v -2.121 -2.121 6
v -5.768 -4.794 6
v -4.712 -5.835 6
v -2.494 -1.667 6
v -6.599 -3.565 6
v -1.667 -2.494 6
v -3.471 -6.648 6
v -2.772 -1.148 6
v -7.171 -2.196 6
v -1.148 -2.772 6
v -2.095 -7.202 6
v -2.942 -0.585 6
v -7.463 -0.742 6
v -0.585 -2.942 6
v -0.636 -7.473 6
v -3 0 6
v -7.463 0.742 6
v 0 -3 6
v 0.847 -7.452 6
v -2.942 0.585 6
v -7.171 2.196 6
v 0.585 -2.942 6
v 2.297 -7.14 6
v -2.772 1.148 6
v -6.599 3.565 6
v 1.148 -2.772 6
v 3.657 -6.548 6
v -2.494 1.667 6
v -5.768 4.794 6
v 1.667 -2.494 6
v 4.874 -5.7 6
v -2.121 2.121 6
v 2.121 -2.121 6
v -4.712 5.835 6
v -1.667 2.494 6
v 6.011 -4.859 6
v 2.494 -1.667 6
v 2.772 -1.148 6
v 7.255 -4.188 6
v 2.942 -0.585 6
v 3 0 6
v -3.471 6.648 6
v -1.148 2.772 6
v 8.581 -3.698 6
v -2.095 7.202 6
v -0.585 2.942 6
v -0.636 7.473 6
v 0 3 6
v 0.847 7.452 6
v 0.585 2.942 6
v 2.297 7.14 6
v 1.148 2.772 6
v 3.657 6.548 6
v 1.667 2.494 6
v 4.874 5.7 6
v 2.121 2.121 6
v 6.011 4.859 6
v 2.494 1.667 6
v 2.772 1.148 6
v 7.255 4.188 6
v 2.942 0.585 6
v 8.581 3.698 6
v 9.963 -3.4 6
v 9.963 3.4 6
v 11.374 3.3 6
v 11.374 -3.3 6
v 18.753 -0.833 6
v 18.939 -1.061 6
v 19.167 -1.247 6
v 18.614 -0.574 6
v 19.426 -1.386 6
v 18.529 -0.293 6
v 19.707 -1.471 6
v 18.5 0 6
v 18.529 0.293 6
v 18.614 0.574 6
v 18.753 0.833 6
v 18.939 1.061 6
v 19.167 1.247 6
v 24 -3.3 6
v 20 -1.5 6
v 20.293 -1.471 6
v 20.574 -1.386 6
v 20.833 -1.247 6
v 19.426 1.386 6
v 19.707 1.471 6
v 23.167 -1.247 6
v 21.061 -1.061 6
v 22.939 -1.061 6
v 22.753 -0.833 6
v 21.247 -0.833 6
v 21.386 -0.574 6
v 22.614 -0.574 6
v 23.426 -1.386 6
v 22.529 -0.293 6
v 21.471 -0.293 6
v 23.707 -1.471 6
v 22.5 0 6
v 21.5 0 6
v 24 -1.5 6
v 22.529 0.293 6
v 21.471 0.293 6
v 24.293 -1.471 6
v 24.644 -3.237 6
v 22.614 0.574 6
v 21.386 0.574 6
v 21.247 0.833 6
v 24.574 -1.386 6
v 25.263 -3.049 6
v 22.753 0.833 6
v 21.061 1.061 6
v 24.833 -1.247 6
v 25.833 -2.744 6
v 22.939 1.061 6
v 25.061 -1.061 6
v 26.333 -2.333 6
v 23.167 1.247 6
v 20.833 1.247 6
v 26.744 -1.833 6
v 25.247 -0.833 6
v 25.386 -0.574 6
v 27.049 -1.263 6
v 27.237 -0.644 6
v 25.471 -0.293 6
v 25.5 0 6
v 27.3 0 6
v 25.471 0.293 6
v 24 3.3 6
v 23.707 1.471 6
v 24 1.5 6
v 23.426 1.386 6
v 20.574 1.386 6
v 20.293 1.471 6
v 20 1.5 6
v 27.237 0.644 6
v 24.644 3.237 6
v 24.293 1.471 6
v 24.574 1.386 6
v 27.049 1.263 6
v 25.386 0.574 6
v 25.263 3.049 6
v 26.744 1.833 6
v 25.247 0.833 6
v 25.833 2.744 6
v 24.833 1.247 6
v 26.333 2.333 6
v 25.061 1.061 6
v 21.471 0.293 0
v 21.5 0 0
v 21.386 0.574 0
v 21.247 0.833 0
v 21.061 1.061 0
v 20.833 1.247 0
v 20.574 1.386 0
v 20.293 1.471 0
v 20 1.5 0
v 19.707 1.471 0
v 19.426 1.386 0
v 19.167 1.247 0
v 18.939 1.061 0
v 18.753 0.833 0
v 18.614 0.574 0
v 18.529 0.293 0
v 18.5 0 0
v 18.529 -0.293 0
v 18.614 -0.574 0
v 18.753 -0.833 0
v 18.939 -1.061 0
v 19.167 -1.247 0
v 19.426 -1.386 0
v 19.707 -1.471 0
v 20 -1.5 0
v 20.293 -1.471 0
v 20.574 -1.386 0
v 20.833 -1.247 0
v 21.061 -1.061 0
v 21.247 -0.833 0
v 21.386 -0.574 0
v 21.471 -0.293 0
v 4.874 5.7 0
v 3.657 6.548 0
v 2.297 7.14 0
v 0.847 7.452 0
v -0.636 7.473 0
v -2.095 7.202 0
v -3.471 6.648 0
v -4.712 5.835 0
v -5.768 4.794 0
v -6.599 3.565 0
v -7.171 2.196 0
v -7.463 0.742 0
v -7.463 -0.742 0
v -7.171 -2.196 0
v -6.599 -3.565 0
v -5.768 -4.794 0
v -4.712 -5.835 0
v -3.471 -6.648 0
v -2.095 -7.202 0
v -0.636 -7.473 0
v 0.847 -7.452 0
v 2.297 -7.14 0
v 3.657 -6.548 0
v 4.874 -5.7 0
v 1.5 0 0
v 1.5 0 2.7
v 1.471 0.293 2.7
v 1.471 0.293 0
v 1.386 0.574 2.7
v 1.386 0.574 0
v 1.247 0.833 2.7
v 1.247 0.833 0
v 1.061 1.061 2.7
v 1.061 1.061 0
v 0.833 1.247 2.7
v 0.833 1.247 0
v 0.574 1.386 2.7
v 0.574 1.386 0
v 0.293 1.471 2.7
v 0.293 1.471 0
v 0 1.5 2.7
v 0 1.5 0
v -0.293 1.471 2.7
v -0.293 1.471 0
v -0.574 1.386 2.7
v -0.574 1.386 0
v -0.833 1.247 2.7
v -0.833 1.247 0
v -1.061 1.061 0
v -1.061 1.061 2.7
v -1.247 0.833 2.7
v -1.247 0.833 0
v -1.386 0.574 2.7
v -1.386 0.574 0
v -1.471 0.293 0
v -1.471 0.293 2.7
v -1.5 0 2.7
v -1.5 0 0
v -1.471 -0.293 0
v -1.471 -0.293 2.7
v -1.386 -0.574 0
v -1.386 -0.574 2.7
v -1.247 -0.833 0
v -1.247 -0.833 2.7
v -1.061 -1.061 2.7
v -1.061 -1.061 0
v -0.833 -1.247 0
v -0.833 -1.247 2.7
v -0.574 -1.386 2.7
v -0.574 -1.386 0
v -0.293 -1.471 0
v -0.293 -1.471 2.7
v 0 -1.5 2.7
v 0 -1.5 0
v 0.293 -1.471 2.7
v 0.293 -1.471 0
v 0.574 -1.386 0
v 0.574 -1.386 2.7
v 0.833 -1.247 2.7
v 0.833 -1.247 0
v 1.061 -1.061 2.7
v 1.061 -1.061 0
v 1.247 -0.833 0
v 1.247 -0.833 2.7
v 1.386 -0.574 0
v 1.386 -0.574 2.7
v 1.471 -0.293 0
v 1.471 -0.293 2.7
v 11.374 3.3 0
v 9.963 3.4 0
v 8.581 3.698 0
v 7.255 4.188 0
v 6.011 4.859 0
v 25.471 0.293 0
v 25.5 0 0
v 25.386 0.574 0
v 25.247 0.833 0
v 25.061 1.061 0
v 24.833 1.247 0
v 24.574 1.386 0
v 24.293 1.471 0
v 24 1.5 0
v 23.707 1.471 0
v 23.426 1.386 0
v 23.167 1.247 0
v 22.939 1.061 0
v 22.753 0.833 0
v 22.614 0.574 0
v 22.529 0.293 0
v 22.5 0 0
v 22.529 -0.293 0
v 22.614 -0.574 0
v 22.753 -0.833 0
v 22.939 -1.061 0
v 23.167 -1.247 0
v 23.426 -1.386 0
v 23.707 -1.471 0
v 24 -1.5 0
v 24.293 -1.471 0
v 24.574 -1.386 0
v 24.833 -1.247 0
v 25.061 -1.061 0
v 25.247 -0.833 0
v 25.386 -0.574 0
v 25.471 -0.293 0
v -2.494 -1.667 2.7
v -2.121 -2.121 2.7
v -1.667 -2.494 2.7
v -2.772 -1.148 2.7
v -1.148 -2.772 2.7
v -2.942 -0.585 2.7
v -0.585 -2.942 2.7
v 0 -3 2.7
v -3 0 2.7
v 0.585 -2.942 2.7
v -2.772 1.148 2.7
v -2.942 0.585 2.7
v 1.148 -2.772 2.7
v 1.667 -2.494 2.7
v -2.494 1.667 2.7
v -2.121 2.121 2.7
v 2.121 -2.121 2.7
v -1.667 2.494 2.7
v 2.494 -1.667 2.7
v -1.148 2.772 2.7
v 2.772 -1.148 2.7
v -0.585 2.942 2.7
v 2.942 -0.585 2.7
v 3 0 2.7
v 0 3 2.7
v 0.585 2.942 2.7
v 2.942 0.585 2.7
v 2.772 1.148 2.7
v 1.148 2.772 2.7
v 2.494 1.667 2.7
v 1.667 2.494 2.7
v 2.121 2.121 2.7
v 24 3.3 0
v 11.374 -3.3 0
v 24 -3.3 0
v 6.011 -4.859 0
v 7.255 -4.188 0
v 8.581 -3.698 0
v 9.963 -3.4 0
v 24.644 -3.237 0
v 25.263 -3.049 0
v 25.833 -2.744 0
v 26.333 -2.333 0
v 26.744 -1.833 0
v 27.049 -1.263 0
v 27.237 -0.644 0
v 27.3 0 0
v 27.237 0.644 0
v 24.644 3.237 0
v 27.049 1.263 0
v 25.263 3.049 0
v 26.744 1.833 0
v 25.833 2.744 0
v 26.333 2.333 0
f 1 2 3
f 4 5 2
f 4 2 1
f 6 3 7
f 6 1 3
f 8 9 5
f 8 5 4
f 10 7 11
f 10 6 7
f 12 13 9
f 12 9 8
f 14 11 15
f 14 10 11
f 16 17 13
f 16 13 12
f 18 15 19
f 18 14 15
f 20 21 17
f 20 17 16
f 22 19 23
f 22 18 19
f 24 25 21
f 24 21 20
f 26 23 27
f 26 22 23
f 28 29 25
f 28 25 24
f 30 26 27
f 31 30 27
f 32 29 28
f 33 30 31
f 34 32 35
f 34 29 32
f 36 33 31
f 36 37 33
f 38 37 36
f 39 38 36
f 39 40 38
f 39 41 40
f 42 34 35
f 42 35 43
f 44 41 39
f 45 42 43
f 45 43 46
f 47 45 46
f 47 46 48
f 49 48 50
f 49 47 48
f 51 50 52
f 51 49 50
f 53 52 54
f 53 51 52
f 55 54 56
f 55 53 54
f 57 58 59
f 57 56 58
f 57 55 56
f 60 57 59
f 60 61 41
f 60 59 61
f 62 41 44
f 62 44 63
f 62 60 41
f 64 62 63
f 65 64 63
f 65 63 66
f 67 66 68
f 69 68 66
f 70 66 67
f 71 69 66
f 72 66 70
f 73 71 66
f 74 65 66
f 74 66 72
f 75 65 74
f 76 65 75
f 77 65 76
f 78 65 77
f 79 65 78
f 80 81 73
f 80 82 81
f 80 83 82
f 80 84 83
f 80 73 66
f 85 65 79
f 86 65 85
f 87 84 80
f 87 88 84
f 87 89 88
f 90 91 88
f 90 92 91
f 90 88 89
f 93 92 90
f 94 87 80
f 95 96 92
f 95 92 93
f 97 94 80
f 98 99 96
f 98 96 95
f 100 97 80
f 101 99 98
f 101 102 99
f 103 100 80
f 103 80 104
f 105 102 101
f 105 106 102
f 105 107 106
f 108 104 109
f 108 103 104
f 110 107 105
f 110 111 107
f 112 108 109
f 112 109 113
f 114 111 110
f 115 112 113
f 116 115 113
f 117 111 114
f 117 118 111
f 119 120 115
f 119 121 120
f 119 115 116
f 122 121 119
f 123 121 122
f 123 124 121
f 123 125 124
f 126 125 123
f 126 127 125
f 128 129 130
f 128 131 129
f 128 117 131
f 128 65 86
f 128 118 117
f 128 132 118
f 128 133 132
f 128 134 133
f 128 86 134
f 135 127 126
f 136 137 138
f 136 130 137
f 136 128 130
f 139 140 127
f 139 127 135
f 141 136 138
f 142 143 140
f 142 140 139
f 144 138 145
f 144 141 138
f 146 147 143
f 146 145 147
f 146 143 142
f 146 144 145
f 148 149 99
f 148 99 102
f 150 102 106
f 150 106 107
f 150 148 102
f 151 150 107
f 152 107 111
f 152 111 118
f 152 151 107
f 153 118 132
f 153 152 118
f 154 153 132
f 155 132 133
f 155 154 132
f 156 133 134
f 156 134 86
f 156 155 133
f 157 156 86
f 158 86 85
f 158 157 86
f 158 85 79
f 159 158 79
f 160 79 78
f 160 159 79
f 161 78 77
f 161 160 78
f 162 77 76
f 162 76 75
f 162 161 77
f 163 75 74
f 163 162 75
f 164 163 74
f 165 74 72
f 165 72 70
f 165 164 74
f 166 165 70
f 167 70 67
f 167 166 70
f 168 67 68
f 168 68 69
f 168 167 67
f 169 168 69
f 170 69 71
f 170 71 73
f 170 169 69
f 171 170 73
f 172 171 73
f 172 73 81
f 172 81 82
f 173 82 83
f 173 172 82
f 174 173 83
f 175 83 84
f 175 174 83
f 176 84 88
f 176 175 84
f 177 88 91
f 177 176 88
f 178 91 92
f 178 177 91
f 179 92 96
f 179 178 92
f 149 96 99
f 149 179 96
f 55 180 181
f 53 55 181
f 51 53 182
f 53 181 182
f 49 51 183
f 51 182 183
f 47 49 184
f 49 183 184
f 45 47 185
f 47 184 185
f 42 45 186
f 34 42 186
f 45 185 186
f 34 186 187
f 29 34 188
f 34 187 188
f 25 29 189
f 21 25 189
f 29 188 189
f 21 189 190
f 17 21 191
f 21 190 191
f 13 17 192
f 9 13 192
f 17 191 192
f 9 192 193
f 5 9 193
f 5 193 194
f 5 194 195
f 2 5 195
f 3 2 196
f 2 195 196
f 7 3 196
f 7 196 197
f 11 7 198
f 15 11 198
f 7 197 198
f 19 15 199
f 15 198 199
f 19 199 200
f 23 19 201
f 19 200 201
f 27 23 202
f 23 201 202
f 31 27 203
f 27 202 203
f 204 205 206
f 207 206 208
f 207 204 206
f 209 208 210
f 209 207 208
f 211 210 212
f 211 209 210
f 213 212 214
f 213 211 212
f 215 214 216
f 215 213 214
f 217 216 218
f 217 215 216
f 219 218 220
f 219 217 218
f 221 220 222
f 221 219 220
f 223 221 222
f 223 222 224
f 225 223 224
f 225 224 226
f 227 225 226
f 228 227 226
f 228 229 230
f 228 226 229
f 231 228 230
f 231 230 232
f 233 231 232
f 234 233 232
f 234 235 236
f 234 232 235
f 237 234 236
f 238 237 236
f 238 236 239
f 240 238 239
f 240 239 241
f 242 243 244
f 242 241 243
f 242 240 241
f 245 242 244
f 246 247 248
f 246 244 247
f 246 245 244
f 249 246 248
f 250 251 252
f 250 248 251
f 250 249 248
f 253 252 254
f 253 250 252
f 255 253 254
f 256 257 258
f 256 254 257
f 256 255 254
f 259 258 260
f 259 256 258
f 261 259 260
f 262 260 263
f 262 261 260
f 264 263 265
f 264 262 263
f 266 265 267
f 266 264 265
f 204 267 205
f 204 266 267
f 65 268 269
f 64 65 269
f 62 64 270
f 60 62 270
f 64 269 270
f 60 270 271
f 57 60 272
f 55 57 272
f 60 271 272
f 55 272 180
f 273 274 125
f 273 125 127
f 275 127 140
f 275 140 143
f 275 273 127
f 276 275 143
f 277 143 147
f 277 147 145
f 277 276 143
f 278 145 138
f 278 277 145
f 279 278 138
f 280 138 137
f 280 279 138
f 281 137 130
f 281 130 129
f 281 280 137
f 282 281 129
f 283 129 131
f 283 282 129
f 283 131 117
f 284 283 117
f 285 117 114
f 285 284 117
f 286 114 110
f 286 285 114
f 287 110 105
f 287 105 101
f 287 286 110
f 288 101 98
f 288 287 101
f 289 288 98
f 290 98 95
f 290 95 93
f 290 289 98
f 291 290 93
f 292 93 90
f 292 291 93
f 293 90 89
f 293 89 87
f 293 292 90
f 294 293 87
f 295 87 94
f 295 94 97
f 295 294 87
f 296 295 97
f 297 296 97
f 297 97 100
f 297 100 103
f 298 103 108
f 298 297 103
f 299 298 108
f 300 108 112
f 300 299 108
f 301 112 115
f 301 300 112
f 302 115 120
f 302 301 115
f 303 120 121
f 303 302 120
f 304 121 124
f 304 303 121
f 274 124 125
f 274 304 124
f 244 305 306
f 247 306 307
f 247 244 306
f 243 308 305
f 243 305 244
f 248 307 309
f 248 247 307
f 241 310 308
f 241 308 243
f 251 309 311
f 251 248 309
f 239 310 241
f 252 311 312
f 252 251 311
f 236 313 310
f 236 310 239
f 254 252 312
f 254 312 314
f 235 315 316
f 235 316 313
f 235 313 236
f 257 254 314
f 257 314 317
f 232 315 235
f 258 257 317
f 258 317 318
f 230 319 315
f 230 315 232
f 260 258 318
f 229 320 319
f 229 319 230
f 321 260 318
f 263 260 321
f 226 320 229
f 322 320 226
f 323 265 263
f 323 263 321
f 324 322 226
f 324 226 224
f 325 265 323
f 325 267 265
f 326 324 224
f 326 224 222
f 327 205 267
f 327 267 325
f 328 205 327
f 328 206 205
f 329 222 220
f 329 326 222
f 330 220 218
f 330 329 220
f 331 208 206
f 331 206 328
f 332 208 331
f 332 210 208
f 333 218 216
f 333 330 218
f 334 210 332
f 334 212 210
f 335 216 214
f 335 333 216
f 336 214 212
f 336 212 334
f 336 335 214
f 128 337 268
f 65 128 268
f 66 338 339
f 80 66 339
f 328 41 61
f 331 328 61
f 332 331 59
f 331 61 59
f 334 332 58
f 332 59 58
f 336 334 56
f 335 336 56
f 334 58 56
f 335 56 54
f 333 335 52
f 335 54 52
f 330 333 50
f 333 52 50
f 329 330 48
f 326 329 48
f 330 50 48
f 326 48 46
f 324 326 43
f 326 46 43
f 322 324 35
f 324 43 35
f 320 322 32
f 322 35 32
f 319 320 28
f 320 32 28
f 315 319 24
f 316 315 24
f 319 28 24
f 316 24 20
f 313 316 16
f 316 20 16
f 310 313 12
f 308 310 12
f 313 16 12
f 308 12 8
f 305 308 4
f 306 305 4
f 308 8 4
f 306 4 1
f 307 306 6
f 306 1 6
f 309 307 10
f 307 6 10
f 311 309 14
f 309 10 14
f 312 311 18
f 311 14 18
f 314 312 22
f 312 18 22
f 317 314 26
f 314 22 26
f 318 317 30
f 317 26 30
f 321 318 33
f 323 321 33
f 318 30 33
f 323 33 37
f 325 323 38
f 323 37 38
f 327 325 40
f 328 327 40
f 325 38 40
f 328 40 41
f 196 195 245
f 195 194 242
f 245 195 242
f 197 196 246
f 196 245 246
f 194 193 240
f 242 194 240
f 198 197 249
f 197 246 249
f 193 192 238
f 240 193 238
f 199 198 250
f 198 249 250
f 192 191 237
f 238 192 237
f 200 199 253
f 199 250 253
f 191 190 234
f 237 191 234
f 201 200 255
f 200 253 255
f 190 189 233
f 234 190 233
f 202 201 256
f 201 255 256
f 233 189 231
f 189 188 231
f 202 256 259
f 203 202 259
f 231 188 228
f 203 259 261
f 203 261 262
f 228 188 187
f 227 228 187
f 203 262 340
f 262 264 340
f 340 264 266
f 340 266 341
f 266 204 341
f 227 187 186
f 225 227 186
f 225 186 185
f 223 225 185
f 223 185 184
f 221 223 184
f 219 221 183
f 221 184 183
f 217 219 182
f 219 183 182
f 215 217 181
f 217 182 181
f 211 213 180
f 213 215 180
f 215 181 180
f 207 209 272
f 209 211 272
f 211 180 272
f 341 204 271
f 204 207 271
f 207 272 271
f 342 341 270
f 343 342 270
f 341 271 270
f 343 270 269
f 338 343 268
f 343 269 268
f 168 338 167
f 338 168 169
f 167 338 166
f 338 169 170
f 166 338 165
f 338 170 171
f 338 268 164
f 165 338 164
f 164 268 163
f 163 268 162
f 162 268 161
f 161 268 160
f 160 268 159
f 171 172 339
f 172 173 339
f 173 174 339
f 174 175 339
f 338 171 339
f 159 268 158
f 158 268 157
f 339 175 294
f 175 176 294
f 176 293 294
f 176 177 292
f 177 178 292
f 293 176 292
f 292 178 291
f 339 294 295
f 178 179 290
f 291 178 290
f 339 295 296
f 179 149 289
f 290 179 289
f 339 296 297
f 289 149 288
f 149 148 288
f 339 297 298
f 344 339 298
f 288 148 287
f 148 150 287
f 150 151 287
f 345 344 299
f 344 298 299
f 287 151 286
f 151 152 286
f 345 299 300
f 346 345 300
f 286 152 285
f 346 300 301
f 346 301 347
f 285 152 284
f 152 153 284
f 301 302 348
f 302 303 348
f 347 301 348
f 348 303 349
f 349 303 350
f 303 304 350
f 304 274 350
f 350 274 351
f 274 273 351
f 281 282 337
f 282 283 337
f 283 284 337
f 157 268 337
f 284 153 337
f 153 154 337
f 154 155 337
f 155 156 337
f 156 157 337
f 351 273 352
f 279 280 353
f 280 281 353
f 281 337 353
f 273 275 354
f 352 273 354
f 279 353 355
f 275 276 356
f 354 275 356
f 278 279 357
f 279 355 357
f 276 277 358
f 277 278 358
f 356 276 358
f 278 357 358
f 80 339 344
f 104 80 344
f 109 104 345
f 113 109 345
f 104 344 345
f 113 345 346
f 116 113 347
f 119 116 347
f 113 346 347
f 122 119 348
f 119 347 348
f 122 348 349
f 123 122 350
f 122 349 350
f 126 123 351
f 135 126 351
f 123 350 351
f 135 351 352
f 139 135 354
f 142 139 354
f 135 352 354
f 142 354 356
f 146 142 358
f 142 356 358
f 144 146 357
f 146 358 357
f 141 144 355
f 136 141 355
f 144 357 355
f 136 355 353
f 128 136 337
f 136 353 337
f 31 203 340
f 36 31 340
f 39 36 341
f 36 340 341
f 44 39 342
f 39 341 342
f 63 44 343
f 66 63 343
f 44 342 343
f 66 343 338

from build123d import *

# Parameters (mm, degrees)
SKETCH_1_R            = 1.5
EXTRUDE_530_DEPTH     = 6
SKETCH_2_R            = 3
CUT_EXTRUDE_709_DEPTH = 3.3


with BuildPart() as part:
    # Эскиз1 → Extrude 530 (new body)
    with BuildSketch(Plane.XY):
        with BuildLine():
            Line((24, 3.3), (11.373653766, 3.3))
            ThreePointArc((11.373653766, 3.3), (7.909552151, 3.91916848), (4.874423043, 5.7))
            ThreePointArc((4.874423043, 5.7), (-7.5, 0), (4.874423043, -5.7))
            ThreePointArc((4.874423043, -5.7), (7.909552151, -3.91916848), (11.373653766, -3.3))
            Line((11.373653766, -3.3), (24, -3.3))
            ThreePointArc((24, -3.3), (27.3, 0), (24, 3.3))
        make_face()
        with Locations((24, 0)):
            Circle(SKETCH_1_R, mode=Mode.SUBTRACT)
        with Locations((20, 0)):
            Circle(SKETCH_1_R, mode=Mode.SUBTRACT)
        Circle(SKETCH_1_R, mode=Mode.SUBTRACT)
    extrude(amount=EXTRUDE_530_DEPTH)

    # Эскиз2 → Cut-Extrude 709 (cut)
    with BuildSketch(Plane.XY.offset(6)):
        Circle(SKETCH_2_R)
    extrude(amount=-CUT_EXTRUDE_709_DEPTH, mode=Mode.SUBTRACT)


solid = part.part
